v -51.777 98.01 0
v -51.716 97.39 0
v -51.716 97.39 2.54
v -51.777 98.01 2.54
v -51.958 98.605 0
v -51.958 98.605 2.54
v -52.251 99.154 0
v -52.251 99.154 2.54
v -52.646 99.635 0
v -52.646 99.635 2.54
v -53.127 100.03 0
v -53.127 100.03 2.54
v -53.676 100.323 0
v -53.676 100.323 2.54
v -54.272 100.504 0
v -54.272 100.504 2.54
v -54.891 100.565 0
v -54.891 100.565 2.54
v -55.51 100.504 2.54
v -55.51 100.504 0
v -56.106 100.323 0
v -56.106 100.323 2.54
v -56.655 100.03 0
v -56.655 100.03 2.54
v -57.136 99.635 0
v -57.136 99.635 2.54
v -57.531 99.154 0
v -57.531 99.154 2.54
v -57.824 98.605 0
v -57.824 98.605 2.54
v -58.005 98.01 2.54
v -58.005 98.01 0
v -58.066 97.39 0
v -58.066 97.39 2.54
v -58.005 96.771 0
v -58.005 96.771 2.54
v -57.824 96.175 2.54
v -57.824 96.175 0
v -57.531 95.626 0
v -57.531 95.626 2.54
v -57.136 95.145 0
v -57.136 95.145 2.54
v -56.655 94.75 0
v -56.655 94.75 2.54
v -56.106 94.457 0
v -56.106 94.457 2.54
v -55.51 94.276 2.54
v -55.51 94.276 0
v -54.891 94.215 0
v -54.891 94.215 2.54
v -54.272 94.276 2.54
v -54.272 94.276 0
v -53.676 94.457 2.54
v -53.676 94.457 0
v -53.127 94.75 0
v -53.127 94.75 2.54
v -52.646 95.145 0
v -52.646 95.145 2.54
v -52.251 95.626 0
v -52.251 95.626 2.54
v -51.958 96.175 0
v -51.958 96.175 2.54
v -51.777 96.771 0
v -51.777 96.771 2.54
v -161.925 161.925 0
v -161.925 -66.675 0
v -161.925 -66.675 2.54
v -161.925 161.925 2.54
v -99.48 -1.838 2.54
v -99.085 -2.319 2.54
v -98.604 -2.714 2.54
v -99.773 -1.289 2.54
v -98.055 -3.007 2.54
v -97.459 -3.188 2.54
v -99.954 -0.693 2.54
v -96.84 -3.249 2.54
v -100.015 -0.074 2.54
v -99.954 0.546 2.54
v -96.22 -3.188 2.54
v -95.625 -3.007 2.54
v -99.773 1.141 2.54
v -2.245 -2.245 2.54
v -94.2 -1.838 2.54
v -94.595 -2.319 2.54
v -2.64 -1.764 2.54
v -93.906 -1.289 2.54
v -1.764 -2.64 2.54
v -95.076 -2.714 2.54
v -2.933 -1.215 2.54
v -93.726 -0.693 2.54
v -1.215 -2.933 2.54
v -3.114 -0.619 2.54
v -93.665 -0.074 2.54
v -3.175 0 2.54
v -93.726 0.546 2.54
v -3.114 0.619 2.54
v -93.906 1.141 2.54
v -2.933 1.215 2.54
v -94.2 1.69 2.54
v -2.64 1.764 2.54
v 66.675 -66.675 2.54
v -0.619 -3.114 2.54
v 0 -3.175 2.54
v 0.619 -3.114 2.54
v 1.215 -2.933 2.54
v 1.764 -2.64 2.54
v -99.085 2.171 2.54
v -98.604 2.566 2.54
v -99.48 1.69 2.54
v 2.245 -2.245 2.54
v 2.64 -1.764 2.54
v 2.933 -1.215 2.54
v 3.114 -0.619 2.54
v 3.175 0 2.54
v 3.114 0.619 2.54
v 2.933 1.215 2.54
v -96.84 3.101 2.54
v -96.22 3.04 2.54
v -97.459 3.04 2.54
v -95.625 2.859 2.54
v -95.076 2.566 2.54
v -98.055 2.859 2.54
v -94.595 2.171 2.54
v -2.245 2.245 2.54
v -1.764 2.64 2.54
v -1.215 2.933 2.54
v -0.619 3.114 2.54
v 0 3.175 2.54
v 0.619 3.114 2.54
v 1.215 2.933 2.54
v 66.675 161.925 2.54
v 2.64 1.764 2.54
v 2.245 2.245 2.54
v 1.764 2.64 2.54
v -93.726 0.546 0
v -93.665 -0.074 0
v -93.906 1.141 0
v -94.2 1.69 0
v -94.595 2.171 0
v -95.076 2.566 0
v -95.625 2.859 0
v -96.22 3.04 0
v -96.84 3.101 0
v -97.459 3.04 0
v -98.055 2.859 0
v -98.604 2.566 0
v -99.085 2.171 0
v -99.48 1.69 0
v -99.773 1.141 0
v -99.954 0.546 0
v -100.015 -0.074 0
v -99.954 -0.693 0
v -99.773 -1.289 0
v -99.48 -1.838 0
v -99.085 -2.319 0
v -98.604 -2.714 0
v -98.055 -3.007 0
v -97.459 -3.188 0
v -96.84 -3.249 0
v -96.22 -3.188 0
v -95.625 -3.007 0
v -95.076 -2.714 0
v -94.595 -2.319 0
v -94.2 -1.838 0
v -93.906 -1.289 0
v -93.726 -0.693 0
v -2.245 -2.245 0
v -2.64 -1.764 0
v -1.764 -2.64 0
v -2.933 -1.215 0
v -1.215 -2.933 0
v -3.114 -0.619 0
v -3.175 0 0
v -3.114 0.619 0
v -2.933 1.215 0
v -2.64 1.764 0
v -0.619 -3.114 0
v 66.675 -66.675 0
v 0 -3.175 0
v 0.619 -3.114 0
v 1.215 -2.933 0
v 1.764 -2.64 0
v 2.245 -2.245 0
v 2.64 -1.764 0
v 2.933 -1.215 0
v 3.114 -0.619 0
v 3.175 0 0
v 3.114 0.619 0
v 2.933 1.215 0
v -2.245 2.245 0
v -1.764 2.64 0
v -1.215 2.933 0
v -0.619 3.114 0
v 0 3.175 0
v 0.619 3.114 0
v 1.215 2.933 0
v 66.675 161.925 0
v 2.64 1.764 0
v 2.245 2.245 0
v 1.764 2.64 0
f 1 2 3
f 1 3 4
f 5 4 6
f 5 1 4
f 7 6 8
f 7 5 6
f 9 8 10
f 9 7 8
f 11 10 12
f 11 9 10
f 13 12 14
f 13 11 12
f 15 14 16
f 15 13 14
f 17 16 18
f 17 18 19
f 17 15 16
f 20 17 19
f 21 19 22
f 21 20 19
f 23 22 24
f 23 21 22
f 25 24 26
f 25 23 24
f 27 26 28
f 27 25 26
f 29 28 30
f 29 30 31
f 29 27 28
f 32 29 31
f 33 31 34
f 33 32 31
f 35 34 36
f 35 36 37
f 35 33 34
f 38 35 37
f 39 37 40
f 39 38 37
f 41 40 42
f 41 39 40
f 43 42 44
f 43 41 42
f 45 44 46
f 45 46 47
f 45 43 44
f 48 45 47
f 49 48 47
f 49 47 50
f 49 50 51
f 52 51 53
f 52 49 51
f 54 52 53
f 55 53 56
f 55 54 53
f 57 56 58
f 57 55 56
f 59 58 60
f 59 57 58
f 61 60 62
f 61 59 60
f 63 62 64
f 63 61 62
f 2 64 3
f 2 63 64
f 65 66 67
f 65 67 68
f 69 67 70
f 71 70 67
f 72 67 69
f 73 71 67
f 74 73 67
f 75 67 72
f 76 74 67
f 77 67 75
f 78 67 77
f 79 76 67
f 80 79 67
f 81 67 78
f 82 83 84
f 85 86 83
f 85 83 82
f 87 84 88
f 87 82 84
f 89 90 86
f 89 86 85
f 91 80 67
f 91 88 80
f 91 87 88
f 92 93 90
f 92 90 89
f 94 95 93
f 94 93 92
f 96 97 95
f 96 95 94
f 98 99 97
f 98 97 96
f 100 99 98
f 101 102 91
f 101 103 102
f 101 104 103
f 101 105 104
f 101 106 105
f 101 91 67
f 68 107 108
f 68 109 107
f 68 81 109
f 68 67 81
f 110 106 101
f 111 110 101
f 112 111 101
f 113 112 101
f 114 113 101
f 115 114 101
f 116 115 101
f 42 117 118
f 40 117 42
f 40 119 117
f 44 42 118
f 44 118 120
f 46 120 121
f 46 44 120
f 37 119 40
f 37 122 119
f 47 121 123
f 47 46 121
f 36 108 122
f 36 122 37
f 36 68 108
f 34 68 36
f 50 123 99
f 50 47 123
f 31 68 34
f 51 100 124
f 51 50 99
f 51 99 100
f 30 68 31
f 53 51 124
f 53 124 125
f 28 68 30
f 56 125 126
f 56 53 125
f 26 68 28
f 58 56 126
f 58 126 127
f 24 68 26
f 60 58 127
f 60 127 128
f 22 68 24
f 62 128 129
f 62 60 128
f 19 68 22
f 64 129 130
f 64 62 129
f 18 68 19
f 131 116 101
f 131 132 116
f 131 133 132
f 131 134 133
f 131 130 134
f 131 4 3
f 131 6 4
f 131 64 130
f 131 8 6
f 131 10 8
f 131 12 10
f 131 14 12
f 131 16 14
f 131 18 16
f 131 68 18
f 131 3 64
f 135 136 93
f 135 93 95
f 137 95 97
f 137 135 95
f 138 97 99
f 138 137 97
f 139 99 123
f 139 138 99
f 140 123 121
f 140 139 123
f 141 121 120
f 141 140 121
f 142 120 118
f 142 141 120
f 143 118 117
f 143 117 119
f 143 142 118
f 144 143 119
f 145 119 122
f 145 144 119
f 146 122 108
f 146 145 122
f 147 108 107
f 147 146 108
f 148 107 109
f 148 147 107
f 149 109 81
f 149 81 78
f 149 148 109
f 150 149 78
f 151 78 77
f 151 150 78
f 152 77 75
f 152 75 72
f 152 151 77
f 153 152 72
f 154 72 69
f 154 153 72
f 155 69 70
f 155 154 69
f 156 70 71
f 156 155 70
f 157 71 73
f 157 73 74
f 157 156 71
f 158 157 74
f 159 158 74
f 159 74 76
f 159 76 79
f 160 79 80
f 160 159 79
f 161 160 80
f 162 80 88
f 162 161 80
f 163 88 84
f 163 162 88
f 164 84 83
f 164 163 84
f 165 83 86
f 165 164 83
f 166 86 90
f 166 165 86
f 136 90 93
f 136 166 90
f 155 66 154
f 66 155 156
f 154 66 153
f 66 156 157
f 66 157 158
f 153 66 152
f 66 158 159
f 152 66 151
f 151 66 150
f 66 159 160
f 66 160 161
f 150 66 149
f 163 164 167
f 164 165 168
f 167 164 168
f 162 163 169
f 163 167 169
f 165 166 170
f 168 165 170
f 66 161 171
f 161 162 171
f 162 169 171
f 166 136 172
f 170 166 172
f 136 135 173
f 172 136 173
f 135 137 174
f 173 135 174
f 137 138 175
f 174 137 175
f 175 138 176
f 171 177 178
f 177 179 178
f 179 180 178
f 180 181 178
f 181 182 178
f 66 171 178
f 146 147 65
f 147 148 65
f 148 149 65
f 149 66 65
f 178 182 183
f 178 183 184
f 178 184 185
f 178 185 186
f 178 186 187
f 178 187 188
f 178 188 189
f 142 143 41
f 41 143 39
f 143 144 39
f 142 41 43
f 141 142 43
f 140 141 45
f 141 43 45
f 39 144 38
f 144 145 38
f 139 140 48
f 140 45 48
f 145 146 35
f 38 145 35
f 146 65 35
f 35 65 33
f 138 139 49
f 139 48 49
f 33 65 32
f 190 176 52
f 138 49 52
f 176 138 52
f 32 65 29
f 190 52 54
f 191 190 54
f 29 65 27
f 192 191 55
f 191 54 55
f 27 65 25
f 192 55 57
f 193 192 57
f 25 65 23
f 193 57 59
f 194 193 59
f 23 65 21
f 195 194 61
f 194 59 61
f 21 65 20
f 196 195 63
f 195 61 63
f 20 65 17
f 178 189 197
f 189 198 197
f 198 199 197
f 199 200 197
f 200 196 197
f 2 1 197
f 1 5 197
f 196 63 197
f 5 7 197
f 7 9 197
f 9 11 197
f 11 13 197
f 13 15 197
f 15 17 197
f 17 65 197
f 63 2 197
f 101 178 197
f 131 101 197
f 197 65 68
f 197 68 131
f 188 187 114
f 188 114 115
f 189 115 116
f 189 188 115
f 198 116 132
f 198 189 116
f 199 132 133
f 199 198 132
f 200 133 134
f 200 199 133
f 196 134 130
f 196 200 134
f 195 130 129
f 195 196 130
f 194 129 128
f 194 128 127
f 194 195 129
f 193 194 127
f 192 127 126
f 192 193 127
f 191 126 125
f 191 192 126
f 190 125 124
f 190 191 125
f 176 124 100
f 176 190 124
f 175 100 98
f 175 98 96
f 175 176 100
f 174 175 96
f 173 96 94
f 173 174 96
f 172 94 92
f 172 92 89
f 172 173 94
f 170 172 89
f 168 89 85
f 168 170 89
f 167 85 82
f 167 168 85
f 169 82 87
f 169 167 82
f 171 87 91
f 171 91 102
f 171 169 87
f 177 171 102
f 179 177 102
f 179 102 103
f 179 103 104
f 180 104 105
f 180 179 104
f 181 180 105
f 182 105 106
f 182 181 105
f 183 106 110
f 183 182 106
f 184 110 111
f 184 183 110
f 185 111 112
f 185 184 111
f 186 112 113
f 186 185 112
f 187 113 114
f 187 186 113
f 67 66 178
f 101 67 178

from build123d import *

# Parameters (mm, degrees)
SKETCH1_W           = 228.6
SKETCH1_H           = 228.6
SKETCH1_R           = 3.175
BOSS_EXTRUDE1_DEPTH = 2.54


with BuildPart() as part:
    # Sketch1 → Boss-Extrude1 (new body)
    with BuildSketch(Plane.XY):
        with Locations((-47.625, 47.625)):
            Rectangle(SKETCH1_W, SKETCH1_H)
        Circle(SKETCH1_R, mode=Mode.SUBTRACT)
        with Locations((-96.839734868, -0.073822651)):
            Circle(SKETCH1_R, mode=Mode.SUBTRACT)
        with Locations((-54.890998924, 97.390088929)):
            Circle(SKETCH1_R, mode=Mode.SUBTRACT)
    extrude(amount=BOSS_EXTRUDE1_DEPTH)


solid = part.part
